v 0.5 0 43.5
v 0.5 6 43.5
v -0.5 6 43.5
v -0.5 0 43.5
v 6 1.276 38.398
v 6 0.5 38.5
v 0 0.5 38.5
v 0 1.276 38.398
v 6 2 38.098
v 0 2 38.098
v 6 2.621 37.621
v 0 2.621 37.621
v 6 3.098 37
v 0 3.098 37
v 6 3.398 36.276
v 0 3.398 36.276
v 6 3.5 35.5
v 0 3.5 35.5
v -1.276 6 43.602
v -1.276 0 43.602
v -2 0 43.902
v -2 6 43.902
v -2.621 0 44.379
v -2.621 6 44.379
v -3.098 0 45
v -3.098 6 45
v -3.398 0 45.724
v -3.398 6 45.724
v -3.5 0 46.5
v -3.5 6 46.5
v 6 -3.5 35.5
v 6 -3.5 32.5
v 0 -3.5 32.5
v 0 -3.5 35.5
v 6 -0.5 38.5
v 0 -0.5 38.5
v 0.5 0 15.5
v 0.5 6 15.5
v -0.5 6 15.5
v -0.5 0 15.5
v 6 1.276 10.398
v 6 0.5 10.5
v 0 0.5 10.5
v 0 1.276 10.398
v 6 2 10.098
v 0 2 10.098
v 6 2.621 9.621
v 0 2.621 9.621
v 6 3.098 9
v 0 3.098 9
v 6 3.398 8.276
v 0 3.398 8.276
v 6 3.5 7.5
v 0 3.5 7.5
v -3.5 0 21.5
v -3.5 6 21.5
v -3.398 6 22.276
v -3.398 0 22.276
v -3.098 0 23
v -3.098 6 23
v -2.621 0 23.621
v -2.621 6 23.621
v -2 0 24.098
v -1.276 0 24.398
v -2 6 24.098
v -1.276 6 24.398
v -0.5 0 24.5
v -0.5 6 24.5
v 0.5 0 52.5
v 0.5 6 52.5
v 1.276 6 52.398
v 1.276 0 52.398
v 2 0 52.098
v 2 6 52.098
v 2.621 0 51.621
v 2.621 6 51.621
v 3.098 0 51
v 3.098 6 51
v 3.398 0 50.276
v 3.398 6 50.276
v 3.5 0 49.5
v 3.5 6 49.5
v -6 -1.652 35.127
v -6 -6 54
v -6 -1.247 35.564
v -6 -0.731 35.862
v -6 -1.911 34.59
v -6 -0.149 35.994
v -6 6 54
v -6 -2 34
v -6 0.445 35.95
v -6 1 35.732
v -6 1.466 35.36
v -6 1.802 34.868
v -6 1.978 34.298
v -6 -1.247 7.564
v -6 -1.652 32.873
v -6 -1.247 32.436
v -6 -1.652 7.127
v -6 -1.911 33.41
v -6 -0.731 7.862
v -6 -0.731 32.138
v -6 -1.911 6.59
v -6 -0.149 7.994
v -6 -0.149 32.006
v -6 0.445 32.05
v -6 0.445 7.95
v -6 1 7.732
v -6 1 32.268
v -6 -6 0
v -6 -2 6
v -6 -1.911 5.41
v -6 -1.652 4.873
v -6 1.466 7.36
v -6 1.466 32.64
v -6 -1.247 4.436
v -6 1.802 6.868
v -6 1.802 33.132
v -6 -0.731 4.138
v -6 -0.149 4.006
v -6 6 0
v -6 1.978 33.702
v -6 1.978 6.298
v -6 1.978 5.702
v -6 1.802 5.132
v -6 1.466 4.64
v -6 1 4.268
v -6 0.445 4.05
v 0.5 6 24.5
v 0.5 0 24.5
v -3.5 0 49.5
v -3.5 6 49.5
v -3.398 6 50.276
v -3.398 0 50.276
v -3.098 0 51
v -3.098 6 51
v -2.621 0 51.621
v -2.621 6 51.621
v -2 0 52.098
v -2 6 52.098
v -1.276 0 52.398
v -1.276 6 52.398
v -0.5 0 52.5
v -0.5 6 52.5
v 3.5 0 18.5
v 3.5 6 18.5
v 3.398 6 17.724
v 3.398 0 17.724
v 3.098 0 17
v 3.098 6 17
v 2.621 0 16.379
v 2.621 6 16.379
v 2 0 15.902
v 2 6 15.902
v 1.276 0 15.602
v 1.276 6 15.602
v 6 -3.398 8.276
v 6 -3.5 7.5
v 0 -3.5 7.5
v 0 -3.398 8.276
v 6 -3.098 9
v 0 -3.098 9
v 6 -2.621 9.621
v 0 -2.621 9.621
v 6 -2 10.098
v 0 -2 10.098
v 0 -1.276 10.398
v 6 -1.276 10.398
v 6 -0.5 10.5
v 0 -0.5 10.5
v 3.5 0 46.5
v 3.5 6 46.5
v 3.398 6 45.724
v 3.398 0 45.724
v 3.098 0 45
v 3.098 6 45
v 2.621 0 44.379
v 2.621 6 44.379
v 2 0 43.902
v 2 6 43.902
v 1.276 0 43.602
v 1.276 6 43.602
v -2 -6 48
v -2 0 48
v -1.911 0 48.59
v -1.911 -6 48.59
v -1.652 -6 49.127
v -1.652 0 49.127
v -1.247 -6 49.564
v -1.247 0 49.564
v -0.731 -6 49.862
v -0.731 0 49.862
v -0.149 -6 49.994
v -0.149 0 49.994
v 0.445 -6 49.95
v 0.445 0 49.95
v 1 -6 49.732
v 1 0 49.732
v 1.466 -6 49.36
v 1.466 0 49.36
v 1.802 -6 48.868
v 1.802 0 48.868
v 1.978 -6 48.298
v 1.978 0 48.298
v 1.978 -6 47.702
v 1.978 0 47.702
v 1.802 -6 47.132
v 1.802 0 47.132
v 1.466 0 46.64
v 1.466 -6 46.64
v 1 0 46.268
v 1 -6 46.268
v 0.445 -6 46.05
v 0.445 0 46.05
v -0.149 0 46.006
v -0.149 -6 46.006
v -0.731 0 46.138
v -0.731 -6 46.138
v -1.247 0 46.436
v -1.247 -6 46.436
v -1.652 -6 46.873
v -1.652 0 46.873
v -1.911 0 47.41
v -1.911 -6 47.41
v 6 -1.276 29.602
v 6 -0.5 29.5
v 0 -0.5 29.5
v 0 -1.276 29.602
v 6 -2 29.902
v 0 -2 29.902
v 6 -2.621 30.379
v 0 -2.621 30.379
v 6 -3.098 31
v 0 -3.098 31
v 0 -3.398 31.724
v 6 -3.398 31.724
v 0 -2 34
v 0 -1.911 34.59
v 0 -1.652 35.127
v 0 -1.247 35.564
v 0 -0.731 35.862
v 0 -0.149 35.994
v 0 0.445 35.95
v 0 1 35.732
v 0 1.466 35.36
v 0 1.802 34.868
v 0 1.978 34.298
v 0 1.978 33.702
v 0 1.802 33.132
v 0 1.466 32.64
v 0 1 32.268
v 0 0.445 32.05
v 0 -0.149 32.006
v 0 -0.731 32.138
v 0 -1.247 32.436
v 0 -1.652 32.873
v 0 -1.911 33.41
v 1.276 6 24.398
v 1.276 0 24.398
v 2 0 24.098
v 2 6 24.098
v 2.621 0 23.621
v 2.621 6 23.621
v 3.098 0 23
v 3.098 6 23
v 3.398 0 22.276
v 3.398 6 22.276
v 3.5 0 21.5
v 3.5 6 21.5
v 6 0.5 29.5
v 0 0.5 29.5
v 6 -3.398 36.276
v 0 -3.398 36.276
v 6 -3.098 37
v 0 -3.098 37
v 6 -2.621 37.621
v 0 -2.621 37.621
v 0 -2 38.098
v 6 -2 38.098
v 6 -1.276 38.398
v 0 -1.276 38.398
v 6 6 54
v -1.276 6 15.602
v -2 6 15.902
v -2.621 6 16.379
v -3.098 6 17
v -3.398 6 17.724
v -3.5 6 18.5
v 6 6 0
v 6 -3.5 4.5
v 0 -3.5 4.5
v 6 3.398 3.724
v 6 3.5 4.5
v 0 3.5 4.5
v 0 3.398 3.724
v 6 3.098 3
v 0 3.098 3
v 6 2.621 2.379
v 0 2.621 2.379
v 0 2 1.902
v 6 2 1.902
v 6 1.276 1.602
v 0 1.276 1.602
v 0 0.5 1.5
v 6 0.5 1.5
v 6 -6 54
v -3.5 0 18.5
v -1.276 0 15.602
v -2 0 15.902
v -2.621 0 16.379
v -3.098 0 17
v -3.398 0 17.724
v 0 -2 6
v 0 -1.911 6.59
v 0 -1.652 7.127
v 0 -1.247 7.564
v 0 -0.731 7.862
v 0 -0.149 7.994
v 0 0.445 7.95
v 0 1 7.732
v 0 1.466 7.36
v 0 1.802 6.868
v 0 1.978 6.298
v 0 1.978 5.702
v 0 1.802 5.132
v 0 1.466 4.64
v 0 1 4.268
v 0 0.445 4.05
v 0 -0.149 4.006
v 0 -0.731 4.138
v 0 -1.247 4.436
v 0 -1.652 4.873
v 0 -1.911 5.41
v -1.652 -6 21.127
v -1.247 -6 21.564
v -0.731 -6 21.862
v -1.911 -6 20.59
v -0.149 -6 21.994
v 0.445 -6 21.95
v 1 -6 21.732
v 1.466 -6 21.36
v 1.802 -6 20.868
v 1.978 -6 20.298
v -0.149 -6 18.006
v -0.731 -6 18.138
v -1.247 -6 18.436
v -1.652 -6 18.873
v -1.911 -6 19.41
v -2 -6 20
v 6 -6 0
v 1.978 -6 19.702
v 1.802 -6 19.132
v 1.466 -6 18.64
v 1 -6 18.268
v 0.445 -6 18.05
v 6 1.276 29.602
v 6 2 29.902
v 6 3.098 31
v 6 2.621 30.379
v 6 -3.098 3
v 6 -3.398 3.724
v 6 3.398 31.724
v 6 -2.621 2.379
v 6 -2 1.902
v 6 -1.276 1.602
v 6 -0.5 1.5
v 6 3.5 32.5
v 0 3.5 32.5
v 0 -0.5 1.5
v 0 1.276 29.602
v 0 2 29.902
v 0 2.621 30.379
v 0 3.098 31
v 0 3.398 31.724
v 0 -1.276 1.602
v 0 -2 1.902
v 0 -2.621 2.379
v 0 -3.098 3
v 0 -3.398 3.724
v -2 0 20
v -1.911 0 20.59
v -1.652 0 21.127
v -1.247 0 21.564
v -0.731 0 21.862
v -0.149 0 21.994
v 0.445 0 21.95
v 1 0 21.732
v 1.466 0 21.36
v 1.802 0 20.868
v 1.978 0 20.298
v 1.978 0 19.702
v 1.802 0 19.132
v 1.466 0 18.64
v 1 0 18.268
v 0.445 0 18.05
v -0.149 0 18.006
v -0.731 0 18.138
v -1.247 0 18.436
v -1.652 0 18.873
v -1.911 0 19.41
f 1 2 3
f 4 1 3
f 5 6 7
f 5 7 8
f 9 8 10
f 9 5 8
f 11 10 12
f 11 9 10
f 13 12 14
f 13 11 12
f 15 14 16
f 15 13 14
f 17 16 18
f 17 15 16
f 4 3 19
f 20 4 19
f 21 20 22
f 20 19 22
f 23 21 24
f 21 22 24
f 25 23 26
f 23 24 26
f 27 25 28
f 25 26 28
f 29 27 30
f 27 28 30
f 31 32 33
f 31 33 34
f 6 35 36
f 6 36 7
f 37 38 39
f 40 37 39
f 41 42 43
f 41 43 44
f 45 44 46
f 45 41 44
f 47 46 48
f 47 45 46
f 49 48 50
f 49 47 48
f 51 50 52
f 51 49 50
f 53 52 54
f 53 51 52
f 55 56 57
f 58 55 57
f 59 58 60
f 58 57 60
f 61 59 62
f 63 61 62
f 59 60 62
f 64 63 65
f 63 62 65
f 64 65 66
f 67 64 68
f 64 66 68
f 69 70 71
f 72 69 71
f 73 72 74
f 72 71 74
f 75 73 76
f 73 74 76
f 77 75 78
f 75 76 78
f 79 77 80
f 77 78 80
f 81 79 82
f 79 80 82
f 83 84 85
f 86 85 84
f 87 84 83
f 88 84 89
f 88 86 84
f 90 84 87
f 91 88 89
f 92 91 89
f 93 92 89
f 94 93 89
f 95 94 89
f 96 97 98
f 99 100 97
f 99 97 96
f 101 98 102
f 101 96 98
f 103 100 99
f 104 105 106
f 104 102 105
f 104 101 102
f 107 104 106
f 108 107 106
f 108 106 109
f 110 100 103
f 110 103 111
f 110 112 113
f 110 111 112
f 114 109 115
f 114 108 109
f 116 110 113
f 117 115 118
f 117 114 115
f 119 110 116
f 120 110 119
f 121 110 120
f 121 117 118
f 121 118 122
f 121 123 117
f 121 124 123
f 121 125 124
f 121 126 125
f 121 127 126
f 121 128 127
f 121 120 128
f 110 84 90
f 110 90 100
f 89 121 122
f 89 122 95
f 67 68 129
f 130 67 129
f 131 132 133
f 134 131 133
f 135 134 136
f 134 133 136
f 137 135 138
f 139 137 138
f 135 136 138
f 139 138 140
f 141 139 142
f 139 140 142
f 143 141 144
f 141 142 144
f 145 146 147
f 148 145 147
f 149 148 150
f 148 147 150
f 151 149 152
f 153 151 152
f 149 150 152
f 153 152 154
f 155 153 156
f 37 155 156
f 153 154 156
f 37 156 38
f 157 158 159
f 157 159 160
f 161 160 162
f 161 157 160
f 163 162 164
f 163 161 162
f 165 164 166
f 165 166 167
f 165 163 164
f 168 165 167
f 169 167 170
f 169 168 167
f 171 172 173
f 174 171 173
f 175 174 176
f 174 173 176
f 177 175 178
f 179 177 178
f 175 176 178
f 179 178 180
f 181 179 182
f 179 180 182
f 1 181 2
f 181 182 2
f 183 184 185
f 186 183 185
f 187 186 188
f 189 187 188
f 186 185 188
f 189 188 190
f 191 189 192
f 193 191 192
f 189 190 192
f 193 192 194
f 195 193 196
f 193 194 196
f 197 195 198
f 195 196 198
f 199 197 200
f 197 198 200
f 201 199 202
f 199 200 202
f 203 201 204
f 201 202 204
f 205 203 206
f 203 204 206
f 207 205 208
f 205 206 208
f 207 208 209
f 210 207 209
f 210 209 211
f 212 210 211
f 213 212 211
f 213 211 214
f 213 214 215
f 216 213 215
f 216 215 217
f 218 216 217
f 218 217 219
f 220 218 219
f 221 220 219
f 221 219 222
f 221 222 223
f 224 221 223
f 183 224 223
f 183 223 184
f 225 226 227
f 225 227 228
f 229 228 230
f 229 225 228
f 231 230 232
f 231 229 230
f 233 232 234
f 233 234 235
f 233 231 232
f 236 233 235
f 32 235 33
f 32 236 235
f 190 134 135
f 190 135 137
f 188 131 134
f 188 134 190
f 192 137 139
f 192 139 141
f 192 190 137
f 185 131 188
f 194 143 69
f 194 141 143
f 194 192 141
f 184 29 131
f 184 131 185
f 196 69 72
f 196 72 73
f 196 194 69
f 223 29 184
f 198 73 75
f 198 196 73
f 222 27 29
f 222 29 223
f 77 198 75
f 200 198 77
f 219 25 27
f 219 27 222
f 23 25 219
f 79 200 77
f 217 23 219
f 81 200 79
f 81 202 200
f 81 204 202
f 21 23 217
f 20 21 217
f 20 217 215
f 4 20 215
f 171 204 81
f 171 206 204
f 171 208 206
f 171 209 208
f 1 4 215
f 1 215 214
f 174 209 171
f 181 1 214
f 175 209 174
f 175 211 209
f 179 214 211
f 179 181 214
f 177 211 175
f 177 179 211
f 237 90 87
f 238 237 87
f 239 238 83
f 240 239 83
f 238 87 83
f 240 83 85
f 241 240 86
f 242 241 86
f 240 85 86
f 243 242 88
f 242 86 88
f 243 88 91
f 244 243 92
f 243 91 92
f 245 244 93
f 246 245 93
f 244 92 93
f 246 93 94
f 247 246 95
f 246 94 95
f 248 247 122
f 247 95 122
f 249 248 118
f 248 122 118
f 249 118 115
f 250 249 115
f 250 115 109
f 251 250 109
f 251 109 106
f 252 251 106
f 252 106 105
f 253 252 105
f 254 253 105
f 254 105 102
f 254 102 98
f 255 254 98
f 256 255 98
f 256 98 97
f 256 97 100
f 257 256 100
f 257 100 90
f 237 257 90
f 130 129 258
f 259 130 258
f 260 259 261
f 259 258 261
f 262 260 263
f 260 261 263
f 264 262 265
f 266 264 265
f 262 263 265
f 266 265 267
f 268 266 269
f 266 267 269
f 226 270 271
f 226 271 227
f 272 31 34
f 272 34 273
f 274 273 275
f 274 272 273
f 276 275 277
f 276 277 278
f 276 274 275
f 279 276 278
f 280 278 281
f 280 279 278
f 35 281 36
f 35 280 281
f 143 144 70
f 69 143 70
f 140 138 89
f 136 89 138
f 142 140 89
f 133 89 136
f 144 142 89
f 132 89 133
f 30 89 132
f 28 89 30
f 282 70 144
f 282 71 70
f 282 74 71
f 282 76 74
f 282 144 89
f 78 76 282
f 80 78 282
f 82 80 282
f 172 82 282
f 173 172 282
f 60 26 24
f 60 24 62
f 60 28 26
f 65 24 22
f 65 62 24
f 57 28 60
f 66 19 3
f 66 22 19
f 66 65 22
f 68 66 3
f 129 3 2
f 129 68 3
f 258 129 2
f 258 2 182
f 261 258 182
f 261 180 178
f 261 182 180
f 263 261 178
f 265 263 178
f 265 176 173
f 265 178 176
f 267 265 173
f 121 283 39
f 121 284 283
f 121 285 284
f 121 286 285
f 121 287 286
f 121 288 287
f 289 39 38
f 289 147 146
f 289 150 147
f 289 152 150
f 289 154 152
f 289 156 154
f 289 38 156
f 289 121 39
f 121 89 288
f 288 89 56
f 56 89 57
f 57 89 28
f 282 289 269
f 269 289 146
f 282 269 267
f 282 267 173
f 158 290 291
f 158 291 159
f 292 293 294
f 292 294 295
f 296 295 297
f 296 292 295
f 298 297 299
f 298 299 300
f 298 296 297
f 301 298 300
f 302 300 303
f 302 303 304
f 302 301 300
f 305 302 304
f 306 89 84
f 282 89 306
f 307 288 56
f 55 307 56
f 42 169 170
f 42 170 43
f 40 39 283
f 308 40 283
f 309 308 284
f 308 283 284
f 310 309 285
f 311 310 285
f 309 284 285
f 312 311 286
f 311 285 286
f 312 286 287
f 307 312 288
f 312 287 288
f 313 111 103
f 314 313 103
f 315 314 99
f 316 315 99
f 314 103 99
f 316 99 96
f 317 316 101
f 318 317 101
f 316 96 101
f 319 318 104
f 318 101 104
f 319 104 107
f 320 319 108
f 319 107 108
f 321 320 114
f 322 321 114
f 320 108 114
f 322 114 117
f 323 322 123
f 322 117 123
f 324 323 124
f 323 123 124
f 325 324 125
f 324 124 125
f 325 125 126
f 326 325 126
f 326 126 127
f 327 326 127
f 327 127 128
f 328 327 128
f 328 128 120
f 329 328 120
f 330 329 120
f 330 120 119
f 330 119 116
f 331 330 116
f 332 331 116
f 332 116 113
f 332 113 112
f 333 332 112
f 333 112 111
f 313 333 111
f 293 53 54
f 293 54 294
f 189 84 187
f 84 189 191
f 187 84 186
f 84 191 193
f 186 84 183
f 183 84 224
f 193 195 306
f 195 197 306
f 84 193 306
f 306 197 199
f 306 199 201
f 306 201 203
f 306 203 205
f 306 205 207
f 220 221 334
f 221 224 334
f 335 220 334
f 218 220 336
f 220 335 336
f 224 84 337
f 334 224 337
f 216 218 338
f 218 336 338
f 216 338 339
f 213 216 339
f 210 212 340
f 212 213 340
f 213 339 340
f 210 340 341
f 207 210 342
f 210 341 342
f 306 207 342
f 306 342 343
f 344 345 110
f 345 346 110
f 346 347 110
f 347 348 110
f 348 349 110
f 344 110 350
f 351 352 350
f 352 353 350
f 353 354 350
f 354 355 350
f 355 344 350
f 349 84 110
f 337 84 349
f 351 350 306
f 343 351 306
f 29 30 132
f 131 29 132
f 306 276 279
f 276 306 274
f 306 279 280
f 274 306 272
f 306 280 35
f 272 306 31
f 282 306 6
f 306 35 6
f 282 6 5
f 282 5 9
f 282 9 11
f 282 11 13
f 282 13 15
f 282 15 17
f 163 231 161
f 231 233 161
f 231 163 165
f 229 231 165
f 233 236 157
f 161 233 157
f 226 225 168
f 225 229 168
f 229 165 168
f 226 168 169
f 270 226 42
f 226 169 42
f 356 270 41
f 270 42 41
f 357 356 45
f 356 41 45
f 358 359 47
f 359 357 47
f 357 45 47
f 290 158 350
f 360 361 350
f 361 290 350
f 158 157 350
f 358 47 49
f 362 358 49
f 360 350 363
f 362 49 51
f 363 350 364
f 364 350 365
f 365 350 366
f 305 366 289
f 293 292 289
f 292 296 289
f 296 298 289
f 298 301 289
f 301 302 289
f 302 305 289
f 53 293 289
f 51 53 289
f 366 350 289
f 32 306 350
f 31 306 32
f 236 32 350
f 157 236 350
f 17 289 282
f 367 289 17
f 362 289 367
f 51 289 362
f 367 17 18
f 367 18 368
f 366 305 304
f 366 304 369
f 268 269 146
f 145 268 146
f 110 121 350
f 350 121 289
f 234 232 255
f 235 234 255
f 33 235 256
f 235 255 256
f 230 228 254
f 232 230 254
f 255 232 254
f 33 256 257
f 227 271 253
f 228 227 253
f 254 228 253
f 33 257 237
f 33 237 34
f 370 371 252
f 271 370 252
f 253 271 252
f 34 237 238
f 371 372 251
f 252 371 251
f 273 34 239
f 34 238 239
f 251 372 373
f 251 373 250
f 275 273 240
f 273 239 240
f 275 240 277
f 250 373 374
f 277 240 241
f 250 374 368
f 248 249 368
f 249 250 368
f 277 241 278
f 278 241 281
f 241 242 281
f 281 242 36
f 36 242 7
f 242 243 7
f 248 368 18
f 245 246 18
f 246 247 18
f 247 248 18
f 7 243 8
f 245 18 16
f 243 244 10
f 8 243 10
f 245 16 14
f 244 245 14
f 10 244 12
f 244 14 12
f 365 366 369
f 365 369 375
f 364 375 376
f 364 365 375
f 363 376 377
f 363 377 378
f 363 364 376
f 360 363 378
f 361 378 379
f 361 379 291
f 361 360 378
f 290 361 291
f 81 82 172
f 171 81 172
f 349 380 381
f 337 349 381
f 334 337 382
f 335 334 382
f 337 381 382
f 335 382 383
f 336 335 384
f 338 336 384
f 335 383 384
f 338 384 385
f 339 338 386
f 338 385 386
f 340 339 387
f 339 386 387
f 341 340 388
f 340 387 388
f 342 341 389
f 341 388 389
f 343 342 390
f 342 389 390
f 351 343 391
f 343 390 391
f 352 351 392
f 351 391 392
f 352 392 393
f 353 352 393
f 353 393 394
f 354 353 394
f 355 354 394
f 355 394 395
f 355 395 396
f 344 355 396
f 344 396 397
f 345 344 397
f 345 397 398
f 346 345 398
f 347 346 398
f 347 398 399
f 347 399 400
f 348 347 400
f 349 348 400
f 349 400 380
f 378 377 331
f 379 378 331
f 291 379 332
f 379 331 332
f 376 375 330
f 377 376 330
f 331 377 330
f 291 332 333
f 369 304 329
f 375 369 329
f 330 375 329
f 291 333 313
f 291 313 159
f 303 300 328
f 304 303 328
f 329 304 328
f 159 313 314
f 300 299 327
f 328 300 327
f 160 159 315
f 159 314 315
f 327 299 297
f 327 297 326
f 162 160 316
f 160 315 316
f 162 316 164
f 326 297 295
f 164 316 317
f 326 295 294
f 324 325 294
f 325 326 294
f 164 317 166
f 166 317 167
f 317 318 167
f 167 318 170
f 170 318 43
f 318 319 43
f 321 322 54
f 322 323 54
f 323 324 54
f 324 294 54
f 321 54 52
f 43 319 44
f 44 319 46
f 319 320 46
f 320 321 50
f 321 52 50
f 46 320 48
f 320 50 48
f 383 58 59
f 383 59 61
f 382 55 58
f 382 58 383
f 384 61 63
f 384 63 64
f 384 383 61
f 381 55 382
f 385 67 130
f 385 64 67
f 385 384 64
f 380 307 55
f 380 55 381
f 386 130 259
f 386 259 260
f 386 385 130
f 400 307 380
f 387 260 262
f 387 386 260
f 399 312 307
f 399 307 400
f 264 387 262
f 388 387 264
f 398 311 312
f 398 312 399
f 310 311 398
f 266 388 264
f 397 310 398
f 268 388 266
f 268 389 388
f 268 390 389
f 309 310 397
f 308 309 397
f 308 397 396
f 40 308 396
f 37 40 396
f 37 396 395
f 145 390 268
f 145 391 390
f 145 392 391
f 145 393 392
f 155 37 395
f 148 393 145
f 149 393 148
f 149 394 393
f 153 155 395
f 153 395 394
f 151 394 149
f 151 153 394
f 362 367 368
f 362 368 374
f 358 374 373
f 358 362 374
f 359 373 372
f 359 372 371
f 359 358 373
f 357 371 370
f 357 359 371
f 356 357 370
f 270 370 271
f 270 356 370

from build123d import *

# Parameters (mm, degrees)
SKETCH1_W           = 12
SKETCH1_H           = 12
BOSS_EXTRUDE1_DEPTH = 54
SKETCH2_R           = 2
CUT_EXTRUDE1_DEPTH  = 14
SKETCH3_R           = 2
CUT_EXTRUDE2_DEPTH  = 14
CUT_EXTRUDE3_DEPTH  = 6
CUT_EXTRUDE4_DEPTH  = 6


with BuildPart() as part:
    # Sketch1 → Boss-Extrude1 (new body)
    with BuildSketch(Plane.XY):
        Rectangle(SKETCH1_W, SKETCH1_H)
    extrude(amount=BOSS_EXTRUDE1_DEPTH)

    # Sketch2 → Cut-Extrude1 (cut)
    with BuildSketch(Plane(origin=(0, 6, 0), x_dir=(1, 0, 0), z_dir=(0, 1, 0))):
        with Locations(Location((0, -20, 0), (0, 0, 180))):
            Circle(SKETCH2_R)
        with Locations(Location((0, -48, 0), (0, 0, 180))):
            Circle(SKETCH2_R)
    extrude(amount=-CUT_EXTRUDE1_DEPTH, mode=Mode.SUBTRACT)

    # Sketch3 → Cut-Extrude2 (cut)
    with BuildSketch(Plane.ZY.offset(6)):
        with Locations(Location((34, 0, 0), (0, 0, 270))):
            Circle(SKETCH3_R)
        with Locations(Location((6, 0, 0), (0, 0, 270))):
            Circle(SKETCH3_R)
    extrude(amount=-CUT_EXTRUDE2_DEPTH, mode=Mode.SUBTRACT)

    # Sketch4 → Cut-Extrude3 (cut)
    with BuildSketch(Plane(origin=(6, 0, 0), x_dir=(0, 0, -1), z_dir=(1, 0, 0))):
        with BuildLine():
            Line((-4.5, -3.5), (-7.5, -3.5))
            ThreePointArc((-7.5, -3.5), (-9.621320344, -2.621320344), (-10.5, -0.5))
            Line((-10.5, -0.5), (-10.5, 0.5))
            ThreePointArc((-10.5, 0.5), (-9.621320344, 2.621320344), (-7.5, 3.5))
            Line((-7.5, 3.5), (-4.5, 3.5))
            ThreePointArc((-4.5, 3.5), (-2.378679656, 2.621320344), (-1.5, 0.5))
            Line((-1.5, 0.5), (-1.5, -0.5))
            ThreePointArc((-1.5, -0.5), (-2.378679656, -2.621320344), (-4.5, -3.5))
        make_face()
        with BuildLine():
            Line((-38.5, -0.5), (-38.5, 0.5))
            ThreePointArc((-38.5, 0.5), (-37.621320344, 2.621320344), (-35.5, 3.5))
            Line((-35.5, 3.5), (-32.5, 3.5))
            ThreePointArc((-32.5, 3.5), (-30.378679656, 2.621320344), (-29.5, 0.5))
            Line((-29.5, 0.5), (-29.5, -0.5))
            ThreePointArc((-29.5, -0.5), (-30.378679656, -2.621320344), (-32.5, -3.5))
            Line((-32.5, -3.5), (-35.5, -3.5))
            ThreePointArc((-35.5, -3.5), (-37.621320344, -2.621320344), (-38.5, -0.5))
        make_face()
    extrude(amount=-CUT_EXTRUDE3_DEPTH, mode=Mode.SUBTRACT)

    # Sketch5 → Cut-Extrude4 (cut)
    with BuildSketch(Plane(origin=(0, 6, 0), x_dir=(1, 0, 0), z_dir=(0, 1, 0))):
        with BuildLine():
            Line((-0.5, -52.5), (0.5, -52.5))
            ThreePointArc((0.5, -52.5), (2.621320344, -51.621320344), (3.5, -49.5))
            Line((3.5, -49.5), (3.5, -46.5))
            ThreePointArc((3.5, -46.5), (2.621320344, -44.378679656), (0.5, -43.5))
            Line((0.5, -43.5), (-0.5, -43.5))
            ThreePointArc((-0.5, -43.5), (-2.621320344, -44.378679656), (-3.5, -46.5))
            Line((-3.5, -46.5), (-3.5, -49.5))
            ThreePointArc((-3.5, -49.5), (-2.621320344, -51.621320344), (-0.5, -52.5))
        make_face()
        with BuildLine():
            Line((-0.5, -24.5), (0.5, -24.5))
            ThreePointArc((0.5, -24.5), (2.621320344, -23.621320344), (3.5, -21.5))
            Line((3.5, -21.5), (3.5, -18.5))
            ThreePointArc((3.5, -18.5), (2.621320344, -16.378679656), (0.5, -15.5))
            Line((0.5, -15.5), (-0.5, -15.5))
            ThreePointArc((-0.5, -15.5), (-2.621320344, -16.378679656), (-3.5, -18.5))
            Line((-3.5, -18.5), (-3.5, -21.5))
            ThreePointArc((-3.5, -21.5), (-2.621320344, -23.621320344), (-0.5, -24.5))
        make_face()
    extrude(amount=-CUT_EXTRUDE4_DEPTH, mode=Mode.SUBTRACT)


solid = part.part
